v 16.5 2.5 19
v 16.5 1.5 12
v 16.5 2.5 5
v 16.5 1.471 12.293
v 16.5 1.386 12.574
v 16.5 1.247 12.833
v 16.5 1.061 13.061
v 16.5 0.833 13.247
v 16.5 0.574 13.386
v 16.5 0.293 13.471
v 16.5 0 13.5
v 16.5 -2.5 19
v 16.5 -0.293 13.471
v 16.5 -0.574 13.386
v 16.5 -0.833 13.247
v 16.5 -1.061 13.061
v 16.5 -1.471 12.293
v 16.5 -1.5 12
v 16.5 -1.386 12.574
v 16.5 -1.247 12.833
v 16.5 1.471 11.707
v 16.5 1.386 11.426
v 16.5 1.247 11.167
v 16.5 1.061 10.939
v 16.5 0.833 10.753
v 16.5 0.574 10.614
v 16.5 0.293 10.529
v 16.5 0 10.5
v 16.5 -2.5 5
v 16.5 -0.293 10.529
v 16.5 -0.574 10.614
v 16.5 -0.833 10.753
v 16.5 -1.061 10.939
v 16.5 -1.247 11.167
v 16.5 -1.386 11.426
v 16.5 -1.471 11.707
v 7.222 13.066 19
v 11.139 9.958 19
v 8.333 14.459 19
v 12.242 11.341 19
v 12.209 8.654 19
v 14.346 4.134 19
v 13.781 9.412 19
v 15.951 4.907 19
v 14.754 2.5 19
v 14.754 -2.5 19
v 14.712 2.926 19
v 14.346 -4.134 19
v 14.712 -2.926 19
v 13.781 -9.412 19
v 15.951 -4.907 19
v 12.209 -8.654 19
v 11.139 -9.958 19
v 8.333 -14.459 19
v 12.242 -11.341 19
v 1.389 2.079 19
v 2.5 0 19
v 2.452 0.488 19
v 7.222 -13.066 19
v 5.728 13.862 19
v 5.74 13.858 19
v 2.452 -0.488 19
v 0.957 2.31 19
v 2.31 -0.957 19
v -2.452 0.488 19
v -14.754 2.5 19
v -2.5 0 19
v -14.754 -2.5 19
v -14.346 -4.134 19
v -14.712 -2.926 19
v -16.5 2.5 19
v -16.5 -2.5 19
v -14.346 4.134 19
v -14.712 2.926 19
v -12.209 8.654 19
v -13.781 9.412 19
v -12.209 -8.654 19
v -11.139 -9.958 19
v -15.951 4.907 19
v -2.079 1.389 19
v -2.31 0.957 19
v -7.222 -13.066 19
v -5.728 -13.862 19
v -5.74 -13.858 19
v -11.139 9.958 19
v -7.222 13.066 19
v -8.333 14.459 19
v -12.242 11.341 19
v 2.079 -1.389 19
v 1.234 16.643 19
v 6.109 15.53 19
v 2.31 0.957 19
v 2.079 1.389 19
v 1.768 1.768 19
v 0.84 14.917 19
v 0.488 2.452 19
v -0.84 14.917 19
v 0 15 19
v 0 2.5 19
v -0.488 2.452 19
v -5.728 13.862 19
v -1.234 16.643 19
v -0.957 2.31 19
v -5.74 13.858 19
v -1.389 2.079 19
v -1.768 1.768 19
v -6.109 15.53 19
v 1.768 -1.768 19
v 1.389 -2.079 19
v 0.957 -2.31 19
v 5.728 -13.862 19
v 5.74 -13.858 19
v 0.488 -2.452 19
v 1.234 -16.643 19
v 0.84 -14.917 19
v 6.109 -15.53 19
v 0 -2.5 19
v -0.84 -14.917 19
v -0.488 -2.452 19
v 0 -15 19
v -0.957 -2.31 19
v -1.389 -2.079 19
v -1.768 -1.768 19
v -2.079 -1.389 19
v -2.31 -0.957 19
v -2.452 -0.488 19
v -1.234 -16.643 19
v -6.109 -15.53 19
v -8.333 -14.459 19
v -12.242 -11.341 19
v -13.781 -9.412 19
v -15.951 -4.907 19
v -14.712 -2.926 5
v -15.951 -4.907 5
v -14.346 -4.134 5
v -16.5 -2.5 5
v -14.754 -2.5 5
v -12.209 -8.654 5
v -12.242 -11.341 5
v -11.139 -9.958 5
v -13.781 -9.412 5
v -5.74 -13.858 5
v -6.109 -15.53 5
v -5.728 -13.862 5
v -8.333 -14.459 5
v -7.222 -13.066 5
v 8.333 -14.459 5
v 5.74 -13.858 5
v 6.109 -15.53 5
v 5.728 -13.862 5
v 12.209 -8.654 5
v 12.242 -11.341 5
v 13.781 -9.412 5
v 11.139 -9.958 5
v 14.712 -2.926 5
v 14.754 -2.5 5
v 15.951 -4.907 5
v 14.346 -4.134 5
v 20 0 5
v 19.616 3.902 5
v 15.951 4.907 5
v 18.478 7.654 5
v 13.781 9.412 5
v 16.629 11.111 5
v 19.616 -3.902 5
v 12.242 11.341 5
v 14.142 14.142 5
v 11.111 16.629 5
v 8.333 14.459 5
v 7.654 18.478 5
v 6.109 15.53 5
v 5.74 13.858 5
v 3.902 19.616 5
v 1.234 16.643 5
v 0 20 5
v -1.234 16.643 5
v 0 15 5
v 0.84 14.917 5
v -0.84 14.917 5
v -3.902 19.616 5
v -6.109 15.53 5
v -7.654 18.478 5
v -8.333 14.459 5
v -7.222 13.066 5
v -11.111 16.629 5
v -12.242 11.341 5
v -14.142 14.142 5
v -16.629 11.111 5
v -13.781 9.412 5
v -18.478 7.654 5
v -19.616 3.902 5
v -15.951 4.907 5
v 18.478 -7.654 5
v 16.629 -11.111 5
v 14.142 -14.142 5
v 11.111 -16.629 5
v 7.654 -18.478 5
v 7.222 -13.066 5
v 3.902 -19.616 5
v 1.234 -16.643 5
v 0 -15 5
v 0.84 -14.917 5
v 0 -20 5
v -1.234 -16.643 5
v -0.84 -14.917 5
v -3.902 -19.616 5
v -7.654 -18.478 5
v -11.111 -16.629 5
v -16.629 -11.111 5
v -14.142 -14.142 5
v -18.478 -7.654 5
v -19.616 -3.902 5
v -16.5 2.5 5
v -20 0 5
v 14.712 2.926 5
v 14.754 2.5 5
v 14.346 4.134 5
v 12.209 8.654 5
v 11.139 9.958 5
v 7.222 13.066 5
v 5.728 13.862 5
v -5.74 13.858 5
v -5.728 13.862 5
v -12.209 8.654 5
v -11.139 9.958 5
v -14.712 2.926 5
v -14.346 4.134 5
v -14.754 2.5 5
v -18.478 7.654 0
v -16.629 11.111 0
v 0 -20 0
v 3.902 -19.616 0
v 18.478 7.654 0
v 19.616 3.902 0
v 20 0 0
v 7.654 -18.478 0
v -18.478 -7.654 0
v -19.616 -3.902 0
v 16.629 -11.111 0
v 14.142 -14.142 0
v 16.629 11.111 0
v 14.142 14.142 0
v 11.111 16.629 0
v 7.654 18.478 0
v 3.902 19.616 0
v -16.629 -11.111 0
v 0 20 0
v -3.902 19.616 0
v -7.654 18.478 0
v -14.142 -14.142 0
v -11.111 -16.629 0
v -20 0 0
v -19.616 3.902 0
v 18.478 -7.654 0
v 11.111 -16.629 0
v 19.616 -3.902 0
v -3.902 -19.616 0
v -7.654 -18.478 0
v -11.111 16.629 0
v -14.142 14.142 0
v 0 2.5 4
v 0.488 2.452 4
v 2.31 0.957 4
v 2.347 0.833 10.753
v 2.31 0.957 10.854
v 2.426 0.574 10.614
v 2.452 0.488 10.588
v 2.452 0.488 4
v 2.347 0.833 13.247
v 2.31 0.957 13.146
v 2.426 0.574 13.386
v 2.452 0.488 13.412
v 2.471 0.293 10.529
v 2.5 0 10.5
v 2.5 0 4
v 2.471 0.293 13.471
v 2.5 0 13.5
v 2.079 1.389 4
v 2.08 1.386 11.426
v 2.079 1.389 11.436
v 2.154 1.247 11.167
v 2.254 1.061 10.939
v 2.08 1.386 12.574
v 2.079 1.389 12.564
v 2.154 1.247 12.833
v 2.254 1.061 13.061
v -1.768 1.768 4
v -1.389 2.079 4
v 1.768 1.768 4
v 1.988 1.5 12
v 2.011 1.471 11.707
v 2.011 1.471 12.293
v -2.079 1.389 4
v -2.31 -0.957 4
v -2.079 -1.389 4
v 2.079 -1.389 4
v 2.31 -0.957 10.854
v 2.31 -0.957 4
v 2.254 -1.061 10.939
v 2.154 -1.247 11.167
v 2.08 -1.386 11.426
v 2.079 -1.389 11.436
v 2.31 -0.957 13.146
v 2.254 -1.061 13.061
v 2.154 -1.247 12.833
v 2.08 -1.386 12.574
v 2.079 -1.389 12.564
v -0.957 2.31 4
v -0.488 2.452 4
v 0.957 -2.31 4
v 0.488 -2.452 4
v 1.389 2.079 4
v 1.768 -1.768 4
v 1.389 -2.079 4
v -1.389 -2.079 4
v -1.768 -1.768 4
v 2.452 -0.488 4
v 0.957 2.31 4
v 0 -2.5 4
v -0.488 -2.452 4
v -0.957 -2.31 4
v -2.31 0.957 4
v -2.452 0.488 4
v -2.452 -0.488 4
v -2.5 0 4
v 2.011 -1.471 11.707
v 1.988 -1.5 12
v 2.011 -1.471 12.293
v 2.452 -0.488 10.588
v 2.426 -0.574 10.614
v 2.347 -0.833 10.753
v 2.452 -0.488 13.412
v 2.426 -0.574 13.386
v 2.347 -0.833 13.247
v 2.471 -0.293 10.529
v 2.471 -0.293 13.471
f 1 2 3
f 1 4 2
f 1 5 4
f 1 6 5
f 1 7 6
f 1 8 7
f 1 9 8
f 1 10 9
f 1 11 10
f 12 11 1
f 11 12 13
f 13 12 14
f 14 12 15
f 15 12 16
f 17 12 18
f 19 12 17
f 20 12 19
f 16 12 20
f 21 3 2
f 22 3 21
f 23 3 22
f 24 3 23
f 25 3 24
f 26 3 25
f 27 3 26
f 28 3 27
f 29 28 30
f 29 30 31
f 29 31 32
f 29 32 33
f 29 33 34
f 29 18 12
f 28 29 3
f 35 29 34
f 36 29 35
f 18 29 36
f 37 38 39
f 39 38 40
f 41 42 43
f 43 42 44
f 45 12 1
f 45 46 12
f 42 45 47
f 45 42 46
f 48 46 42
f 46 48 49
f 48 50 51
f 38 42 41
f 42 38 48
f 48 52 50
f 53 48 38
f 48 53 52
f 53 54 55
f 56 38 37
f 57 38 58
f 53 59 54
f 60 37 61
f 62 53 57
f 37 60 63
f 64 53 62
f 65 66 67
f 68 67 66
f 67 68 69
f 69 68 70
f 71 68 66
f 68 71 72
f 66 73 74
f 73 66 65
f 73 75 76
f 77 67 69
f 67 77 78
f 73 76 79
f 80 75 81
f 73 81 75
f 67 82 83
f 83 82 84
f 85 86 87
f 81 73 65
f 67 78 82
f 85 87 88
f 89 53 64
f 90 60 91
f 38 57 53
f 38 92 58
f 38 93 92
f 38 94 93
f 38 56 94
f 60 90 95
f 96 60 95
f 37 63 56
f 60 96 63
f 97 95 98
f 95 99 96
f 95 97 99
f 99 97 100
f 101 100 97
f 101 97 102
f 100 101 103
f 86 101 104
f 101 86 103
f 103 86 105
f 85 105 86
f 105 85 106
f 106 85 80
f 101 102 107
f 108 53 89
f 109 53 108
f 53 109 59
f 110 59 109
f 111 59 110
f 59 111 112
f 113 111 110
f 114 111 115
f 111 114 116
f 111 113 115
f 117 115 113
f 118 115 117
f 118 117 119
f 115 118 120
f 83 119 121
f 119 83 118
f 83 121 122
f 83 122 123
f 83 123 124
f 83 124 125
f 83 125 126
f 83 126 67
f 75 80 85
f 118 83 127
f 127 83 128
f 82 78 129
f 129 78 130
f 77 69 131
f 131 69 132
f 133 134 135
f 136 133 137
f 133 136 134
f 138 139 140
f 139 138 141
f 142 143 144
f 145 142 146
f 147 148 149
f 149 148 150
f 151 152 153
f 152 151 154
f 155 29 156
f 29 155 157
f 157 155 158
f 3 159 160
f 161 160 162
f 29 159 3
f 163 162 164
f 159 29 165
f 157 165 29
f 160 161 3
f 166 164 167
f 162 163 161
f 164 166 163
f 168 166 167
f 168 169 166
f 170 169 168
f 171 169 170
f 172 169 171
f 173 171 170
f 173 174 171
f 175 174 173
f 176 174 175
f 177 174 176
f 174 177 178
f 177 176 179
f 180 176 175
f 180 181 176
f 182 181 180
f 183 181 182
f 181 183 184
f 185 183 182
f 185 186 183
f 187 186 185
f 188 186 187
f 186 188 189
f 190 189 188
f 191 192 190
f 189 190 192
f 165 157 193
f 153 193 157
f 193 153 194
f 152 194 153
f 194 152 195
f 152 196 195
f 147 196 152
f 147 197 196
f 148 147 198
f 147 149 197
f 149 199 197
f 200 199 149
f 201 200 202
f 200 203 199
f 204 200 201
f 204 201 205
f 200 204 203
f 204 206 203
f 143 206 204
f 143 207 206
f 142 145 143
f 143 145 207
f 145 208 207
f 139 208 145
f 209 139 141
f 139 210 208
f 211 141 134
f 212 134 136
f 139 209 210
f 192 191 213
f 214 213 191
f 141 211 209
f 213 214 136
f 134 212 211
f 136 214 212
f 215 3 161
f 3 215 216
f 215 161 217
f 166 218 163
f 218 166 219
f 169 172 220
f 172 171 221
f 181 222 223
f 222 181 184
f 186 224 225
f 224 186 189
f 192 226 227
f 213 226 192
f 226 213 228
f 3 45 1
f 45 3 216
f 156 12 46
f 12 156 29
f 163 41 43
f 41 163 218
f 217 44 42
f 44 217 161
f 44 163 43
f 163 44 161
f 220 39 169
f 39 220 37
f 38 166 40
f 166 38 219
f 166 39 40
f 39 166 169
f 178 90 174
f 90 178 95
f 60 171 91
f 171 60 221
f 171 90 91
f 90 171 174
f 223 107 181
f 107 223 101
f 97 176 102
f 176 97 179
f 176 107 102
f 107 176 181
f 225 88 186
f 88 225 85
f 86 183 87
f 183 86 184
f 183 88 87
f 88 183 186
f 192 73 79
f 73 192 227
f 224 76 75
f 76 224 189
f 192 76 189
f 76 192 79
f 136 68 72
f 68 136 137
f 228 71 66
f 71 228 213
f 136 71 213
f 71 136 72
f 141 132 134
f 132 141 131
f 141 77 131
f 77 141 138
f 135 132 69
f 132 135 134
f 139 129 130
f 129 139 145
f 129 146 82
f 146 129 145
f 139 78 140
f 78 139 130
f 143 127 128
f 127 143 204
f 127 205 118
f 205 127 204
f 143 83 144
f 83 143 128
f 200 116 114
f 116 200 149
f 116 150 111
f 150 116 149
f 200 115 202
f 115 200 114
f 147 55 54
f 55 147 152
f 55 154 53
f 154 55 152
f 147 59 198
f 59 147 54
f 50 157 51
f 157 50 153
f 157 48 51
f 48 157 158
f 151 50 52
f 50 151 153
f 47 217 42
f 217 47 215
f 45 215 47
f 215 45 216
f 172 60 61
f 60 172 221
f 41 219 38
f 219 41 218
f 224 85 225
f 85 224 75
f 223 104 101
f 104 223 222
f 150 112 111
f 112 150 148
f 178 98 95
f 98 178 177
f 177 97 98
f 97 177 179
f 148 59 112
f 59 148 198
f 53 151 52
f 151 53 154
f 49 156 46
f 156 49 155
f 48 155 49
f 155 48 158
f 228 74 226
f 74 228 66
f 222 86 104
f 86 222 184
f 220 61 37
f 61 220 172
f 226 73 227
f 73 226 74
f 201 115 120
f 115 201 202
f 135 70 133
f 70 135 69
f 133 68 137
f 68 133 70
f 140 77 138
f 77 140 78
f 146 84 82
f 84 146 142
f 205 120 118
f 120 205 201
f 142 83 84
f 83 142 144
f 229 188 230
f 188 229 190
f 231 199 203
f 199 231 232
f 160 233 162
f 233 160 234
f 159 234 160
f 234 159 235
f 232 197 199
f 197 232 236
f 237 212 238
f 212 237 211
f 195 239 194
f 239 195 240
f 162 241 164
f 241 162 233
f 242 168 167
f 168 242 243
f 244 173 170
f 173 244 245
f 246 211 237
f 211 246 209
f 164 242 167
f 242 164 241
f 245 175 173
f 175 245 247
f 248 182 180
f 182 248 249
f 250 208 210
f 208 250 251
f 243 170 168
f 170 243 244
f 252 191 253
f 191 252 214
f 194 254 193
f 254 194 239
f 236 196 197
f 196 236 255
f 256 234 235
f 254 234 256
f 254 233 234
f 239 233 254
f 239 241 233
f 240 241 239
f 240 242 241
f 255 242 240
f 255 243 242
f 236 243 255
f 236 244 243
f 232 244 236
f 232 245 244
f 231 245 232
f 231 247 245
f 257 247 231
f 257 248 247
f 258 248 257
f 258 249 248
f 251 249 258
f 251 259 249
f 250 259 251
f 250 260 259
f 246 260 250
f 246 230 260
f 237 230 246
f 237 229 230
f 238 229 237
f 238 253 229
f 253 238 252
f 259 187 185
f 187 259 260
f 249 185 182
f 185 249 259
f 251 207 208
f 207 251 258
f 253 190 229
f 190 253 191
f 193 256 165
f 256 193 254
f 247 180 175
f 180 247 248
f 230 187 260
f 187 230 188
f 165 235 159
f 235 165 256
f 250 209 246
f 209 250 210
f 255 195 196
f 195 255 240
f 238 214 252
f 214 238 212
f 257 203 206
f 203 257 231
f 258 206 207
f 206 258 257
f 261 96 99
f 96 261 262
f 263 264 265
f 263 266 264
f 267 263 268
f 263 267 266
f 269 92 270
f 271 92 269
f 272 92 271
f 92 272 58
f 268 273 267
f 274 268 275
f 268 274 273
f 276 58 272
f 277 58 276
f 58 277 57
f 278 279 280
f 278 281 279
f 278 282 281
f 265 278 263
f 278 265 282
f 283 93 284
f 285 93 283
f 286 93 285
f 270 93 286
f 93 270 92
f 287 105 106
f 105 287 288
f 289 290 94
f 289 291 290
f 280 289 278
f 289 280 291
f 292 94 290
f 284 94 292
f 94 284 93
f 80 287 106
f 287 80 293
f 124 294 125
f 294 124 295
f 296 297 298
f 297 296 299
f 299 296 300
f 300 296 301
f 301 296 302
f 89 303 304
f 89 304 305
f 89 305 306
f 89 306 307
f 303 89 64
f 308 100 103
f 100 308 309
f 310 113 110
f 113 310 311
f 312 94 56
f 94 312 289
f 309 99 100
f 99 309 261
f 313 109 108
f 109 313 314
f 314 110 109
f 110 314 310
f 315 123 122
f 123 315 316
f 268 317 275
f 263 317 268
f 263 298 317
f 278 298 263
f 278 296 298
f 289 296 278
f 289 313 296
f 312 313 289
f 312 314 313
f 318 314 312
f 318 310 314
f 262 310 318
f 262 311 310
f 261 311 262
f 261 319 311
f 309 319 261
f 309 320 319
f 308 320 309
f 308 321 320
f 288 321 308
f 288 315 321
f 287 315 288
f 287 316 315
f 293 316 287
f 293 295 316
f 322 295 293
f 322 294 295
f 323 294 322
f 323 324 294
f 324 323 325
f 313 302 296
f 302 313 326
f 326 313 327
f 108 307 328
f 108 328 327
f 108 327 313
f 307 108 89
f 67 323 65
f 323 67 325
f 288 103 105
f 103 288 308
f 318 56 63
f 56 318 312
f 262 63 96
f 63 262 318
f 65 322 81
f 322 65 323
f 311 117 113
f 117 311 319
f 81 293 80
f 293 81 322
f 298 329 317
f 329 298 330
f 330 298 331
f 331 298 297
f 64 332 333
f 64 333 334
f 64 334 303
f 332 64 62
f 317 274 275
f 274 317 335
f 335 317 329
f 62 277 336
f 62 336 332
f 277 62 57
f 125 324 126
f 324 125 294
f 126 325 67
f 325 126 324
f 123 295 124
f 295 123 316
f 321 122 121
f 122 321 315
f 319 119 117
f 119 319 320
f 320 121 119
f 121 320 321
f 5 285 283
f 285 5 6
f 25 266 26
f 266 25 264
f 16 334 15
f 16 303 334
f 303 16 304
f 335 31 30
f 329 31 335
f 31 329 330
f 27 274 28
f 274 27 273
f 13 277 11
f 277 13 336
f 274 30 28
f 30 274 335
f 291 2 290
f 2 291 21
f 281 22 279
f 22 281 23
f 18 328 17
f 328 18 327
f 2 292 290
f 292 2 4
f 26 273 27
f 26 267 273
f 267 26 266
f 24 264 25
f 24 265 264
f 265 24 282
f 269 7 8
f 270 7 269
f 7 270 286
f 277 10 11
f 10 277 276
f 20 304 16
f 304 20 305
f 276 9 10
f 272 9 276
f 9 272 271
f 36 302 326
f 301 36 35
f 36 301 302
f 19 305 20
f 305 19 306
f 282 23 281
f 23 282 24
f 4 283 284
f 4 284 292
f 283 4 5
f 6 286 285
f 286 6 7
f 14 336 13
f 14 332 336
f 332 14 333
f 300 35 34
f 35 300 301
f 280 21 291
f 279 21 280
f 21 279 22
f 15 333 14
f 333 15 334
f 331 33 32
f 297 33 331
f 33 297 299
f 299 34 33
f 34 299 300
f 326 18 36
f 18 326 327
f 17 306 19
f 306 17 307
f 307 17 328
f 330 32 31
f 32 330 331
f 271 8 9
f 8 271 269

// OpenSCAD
$fn = 32;

// ----------------------------------------------------------------------
// Control knob: skirt knob with grip ribs
// ----------------------------------------------------------------------

// --- parameters (mm) ---
skirt_d = 40;             // skirt diameter
skirt_t = 5;              // skirt thickness
rib_w = 5;                // grip rib width
rib_out = 2.5;            // grip rib radial protrusion
n_ribs = 14;              // number of grip ribs
knob_d = 30;              // knob body diameter
knob_h = 14;              // knob body height
bore_d = 5;               // shaft bore diameter
set_d = 3;                // set screw bore diameter

rib_step = 360 / n_ribs;  // rib angular step
total_h = skirt_t + knob_h;  // overall height

difference() {
  union() {
    translate([0, 0, skirt_t]) cylinder(h = knob_h, d = knob_d);
    cylinder(h = skirt_t, d = skirt_d);
    for (i = [0 : n_ribs - 1])
      rotate([0, 0, i * rib_step])
        translate([knob_d / 2 - 1, -rib_w / 2, skirt_t])
          cube([rib_out, rib_w, knob_h]);
  }
  translate([0, 0, skirt_t - 1]) cylinder(h = knob_h + 2, d = bore_d);
  translate([-1, 0, skirt_t + knob_h / 2]) rotate([0, 90, 0])
    cylinder(h = knob_d / 2 + bore_d / 2 + 2, d = set_d);
}
